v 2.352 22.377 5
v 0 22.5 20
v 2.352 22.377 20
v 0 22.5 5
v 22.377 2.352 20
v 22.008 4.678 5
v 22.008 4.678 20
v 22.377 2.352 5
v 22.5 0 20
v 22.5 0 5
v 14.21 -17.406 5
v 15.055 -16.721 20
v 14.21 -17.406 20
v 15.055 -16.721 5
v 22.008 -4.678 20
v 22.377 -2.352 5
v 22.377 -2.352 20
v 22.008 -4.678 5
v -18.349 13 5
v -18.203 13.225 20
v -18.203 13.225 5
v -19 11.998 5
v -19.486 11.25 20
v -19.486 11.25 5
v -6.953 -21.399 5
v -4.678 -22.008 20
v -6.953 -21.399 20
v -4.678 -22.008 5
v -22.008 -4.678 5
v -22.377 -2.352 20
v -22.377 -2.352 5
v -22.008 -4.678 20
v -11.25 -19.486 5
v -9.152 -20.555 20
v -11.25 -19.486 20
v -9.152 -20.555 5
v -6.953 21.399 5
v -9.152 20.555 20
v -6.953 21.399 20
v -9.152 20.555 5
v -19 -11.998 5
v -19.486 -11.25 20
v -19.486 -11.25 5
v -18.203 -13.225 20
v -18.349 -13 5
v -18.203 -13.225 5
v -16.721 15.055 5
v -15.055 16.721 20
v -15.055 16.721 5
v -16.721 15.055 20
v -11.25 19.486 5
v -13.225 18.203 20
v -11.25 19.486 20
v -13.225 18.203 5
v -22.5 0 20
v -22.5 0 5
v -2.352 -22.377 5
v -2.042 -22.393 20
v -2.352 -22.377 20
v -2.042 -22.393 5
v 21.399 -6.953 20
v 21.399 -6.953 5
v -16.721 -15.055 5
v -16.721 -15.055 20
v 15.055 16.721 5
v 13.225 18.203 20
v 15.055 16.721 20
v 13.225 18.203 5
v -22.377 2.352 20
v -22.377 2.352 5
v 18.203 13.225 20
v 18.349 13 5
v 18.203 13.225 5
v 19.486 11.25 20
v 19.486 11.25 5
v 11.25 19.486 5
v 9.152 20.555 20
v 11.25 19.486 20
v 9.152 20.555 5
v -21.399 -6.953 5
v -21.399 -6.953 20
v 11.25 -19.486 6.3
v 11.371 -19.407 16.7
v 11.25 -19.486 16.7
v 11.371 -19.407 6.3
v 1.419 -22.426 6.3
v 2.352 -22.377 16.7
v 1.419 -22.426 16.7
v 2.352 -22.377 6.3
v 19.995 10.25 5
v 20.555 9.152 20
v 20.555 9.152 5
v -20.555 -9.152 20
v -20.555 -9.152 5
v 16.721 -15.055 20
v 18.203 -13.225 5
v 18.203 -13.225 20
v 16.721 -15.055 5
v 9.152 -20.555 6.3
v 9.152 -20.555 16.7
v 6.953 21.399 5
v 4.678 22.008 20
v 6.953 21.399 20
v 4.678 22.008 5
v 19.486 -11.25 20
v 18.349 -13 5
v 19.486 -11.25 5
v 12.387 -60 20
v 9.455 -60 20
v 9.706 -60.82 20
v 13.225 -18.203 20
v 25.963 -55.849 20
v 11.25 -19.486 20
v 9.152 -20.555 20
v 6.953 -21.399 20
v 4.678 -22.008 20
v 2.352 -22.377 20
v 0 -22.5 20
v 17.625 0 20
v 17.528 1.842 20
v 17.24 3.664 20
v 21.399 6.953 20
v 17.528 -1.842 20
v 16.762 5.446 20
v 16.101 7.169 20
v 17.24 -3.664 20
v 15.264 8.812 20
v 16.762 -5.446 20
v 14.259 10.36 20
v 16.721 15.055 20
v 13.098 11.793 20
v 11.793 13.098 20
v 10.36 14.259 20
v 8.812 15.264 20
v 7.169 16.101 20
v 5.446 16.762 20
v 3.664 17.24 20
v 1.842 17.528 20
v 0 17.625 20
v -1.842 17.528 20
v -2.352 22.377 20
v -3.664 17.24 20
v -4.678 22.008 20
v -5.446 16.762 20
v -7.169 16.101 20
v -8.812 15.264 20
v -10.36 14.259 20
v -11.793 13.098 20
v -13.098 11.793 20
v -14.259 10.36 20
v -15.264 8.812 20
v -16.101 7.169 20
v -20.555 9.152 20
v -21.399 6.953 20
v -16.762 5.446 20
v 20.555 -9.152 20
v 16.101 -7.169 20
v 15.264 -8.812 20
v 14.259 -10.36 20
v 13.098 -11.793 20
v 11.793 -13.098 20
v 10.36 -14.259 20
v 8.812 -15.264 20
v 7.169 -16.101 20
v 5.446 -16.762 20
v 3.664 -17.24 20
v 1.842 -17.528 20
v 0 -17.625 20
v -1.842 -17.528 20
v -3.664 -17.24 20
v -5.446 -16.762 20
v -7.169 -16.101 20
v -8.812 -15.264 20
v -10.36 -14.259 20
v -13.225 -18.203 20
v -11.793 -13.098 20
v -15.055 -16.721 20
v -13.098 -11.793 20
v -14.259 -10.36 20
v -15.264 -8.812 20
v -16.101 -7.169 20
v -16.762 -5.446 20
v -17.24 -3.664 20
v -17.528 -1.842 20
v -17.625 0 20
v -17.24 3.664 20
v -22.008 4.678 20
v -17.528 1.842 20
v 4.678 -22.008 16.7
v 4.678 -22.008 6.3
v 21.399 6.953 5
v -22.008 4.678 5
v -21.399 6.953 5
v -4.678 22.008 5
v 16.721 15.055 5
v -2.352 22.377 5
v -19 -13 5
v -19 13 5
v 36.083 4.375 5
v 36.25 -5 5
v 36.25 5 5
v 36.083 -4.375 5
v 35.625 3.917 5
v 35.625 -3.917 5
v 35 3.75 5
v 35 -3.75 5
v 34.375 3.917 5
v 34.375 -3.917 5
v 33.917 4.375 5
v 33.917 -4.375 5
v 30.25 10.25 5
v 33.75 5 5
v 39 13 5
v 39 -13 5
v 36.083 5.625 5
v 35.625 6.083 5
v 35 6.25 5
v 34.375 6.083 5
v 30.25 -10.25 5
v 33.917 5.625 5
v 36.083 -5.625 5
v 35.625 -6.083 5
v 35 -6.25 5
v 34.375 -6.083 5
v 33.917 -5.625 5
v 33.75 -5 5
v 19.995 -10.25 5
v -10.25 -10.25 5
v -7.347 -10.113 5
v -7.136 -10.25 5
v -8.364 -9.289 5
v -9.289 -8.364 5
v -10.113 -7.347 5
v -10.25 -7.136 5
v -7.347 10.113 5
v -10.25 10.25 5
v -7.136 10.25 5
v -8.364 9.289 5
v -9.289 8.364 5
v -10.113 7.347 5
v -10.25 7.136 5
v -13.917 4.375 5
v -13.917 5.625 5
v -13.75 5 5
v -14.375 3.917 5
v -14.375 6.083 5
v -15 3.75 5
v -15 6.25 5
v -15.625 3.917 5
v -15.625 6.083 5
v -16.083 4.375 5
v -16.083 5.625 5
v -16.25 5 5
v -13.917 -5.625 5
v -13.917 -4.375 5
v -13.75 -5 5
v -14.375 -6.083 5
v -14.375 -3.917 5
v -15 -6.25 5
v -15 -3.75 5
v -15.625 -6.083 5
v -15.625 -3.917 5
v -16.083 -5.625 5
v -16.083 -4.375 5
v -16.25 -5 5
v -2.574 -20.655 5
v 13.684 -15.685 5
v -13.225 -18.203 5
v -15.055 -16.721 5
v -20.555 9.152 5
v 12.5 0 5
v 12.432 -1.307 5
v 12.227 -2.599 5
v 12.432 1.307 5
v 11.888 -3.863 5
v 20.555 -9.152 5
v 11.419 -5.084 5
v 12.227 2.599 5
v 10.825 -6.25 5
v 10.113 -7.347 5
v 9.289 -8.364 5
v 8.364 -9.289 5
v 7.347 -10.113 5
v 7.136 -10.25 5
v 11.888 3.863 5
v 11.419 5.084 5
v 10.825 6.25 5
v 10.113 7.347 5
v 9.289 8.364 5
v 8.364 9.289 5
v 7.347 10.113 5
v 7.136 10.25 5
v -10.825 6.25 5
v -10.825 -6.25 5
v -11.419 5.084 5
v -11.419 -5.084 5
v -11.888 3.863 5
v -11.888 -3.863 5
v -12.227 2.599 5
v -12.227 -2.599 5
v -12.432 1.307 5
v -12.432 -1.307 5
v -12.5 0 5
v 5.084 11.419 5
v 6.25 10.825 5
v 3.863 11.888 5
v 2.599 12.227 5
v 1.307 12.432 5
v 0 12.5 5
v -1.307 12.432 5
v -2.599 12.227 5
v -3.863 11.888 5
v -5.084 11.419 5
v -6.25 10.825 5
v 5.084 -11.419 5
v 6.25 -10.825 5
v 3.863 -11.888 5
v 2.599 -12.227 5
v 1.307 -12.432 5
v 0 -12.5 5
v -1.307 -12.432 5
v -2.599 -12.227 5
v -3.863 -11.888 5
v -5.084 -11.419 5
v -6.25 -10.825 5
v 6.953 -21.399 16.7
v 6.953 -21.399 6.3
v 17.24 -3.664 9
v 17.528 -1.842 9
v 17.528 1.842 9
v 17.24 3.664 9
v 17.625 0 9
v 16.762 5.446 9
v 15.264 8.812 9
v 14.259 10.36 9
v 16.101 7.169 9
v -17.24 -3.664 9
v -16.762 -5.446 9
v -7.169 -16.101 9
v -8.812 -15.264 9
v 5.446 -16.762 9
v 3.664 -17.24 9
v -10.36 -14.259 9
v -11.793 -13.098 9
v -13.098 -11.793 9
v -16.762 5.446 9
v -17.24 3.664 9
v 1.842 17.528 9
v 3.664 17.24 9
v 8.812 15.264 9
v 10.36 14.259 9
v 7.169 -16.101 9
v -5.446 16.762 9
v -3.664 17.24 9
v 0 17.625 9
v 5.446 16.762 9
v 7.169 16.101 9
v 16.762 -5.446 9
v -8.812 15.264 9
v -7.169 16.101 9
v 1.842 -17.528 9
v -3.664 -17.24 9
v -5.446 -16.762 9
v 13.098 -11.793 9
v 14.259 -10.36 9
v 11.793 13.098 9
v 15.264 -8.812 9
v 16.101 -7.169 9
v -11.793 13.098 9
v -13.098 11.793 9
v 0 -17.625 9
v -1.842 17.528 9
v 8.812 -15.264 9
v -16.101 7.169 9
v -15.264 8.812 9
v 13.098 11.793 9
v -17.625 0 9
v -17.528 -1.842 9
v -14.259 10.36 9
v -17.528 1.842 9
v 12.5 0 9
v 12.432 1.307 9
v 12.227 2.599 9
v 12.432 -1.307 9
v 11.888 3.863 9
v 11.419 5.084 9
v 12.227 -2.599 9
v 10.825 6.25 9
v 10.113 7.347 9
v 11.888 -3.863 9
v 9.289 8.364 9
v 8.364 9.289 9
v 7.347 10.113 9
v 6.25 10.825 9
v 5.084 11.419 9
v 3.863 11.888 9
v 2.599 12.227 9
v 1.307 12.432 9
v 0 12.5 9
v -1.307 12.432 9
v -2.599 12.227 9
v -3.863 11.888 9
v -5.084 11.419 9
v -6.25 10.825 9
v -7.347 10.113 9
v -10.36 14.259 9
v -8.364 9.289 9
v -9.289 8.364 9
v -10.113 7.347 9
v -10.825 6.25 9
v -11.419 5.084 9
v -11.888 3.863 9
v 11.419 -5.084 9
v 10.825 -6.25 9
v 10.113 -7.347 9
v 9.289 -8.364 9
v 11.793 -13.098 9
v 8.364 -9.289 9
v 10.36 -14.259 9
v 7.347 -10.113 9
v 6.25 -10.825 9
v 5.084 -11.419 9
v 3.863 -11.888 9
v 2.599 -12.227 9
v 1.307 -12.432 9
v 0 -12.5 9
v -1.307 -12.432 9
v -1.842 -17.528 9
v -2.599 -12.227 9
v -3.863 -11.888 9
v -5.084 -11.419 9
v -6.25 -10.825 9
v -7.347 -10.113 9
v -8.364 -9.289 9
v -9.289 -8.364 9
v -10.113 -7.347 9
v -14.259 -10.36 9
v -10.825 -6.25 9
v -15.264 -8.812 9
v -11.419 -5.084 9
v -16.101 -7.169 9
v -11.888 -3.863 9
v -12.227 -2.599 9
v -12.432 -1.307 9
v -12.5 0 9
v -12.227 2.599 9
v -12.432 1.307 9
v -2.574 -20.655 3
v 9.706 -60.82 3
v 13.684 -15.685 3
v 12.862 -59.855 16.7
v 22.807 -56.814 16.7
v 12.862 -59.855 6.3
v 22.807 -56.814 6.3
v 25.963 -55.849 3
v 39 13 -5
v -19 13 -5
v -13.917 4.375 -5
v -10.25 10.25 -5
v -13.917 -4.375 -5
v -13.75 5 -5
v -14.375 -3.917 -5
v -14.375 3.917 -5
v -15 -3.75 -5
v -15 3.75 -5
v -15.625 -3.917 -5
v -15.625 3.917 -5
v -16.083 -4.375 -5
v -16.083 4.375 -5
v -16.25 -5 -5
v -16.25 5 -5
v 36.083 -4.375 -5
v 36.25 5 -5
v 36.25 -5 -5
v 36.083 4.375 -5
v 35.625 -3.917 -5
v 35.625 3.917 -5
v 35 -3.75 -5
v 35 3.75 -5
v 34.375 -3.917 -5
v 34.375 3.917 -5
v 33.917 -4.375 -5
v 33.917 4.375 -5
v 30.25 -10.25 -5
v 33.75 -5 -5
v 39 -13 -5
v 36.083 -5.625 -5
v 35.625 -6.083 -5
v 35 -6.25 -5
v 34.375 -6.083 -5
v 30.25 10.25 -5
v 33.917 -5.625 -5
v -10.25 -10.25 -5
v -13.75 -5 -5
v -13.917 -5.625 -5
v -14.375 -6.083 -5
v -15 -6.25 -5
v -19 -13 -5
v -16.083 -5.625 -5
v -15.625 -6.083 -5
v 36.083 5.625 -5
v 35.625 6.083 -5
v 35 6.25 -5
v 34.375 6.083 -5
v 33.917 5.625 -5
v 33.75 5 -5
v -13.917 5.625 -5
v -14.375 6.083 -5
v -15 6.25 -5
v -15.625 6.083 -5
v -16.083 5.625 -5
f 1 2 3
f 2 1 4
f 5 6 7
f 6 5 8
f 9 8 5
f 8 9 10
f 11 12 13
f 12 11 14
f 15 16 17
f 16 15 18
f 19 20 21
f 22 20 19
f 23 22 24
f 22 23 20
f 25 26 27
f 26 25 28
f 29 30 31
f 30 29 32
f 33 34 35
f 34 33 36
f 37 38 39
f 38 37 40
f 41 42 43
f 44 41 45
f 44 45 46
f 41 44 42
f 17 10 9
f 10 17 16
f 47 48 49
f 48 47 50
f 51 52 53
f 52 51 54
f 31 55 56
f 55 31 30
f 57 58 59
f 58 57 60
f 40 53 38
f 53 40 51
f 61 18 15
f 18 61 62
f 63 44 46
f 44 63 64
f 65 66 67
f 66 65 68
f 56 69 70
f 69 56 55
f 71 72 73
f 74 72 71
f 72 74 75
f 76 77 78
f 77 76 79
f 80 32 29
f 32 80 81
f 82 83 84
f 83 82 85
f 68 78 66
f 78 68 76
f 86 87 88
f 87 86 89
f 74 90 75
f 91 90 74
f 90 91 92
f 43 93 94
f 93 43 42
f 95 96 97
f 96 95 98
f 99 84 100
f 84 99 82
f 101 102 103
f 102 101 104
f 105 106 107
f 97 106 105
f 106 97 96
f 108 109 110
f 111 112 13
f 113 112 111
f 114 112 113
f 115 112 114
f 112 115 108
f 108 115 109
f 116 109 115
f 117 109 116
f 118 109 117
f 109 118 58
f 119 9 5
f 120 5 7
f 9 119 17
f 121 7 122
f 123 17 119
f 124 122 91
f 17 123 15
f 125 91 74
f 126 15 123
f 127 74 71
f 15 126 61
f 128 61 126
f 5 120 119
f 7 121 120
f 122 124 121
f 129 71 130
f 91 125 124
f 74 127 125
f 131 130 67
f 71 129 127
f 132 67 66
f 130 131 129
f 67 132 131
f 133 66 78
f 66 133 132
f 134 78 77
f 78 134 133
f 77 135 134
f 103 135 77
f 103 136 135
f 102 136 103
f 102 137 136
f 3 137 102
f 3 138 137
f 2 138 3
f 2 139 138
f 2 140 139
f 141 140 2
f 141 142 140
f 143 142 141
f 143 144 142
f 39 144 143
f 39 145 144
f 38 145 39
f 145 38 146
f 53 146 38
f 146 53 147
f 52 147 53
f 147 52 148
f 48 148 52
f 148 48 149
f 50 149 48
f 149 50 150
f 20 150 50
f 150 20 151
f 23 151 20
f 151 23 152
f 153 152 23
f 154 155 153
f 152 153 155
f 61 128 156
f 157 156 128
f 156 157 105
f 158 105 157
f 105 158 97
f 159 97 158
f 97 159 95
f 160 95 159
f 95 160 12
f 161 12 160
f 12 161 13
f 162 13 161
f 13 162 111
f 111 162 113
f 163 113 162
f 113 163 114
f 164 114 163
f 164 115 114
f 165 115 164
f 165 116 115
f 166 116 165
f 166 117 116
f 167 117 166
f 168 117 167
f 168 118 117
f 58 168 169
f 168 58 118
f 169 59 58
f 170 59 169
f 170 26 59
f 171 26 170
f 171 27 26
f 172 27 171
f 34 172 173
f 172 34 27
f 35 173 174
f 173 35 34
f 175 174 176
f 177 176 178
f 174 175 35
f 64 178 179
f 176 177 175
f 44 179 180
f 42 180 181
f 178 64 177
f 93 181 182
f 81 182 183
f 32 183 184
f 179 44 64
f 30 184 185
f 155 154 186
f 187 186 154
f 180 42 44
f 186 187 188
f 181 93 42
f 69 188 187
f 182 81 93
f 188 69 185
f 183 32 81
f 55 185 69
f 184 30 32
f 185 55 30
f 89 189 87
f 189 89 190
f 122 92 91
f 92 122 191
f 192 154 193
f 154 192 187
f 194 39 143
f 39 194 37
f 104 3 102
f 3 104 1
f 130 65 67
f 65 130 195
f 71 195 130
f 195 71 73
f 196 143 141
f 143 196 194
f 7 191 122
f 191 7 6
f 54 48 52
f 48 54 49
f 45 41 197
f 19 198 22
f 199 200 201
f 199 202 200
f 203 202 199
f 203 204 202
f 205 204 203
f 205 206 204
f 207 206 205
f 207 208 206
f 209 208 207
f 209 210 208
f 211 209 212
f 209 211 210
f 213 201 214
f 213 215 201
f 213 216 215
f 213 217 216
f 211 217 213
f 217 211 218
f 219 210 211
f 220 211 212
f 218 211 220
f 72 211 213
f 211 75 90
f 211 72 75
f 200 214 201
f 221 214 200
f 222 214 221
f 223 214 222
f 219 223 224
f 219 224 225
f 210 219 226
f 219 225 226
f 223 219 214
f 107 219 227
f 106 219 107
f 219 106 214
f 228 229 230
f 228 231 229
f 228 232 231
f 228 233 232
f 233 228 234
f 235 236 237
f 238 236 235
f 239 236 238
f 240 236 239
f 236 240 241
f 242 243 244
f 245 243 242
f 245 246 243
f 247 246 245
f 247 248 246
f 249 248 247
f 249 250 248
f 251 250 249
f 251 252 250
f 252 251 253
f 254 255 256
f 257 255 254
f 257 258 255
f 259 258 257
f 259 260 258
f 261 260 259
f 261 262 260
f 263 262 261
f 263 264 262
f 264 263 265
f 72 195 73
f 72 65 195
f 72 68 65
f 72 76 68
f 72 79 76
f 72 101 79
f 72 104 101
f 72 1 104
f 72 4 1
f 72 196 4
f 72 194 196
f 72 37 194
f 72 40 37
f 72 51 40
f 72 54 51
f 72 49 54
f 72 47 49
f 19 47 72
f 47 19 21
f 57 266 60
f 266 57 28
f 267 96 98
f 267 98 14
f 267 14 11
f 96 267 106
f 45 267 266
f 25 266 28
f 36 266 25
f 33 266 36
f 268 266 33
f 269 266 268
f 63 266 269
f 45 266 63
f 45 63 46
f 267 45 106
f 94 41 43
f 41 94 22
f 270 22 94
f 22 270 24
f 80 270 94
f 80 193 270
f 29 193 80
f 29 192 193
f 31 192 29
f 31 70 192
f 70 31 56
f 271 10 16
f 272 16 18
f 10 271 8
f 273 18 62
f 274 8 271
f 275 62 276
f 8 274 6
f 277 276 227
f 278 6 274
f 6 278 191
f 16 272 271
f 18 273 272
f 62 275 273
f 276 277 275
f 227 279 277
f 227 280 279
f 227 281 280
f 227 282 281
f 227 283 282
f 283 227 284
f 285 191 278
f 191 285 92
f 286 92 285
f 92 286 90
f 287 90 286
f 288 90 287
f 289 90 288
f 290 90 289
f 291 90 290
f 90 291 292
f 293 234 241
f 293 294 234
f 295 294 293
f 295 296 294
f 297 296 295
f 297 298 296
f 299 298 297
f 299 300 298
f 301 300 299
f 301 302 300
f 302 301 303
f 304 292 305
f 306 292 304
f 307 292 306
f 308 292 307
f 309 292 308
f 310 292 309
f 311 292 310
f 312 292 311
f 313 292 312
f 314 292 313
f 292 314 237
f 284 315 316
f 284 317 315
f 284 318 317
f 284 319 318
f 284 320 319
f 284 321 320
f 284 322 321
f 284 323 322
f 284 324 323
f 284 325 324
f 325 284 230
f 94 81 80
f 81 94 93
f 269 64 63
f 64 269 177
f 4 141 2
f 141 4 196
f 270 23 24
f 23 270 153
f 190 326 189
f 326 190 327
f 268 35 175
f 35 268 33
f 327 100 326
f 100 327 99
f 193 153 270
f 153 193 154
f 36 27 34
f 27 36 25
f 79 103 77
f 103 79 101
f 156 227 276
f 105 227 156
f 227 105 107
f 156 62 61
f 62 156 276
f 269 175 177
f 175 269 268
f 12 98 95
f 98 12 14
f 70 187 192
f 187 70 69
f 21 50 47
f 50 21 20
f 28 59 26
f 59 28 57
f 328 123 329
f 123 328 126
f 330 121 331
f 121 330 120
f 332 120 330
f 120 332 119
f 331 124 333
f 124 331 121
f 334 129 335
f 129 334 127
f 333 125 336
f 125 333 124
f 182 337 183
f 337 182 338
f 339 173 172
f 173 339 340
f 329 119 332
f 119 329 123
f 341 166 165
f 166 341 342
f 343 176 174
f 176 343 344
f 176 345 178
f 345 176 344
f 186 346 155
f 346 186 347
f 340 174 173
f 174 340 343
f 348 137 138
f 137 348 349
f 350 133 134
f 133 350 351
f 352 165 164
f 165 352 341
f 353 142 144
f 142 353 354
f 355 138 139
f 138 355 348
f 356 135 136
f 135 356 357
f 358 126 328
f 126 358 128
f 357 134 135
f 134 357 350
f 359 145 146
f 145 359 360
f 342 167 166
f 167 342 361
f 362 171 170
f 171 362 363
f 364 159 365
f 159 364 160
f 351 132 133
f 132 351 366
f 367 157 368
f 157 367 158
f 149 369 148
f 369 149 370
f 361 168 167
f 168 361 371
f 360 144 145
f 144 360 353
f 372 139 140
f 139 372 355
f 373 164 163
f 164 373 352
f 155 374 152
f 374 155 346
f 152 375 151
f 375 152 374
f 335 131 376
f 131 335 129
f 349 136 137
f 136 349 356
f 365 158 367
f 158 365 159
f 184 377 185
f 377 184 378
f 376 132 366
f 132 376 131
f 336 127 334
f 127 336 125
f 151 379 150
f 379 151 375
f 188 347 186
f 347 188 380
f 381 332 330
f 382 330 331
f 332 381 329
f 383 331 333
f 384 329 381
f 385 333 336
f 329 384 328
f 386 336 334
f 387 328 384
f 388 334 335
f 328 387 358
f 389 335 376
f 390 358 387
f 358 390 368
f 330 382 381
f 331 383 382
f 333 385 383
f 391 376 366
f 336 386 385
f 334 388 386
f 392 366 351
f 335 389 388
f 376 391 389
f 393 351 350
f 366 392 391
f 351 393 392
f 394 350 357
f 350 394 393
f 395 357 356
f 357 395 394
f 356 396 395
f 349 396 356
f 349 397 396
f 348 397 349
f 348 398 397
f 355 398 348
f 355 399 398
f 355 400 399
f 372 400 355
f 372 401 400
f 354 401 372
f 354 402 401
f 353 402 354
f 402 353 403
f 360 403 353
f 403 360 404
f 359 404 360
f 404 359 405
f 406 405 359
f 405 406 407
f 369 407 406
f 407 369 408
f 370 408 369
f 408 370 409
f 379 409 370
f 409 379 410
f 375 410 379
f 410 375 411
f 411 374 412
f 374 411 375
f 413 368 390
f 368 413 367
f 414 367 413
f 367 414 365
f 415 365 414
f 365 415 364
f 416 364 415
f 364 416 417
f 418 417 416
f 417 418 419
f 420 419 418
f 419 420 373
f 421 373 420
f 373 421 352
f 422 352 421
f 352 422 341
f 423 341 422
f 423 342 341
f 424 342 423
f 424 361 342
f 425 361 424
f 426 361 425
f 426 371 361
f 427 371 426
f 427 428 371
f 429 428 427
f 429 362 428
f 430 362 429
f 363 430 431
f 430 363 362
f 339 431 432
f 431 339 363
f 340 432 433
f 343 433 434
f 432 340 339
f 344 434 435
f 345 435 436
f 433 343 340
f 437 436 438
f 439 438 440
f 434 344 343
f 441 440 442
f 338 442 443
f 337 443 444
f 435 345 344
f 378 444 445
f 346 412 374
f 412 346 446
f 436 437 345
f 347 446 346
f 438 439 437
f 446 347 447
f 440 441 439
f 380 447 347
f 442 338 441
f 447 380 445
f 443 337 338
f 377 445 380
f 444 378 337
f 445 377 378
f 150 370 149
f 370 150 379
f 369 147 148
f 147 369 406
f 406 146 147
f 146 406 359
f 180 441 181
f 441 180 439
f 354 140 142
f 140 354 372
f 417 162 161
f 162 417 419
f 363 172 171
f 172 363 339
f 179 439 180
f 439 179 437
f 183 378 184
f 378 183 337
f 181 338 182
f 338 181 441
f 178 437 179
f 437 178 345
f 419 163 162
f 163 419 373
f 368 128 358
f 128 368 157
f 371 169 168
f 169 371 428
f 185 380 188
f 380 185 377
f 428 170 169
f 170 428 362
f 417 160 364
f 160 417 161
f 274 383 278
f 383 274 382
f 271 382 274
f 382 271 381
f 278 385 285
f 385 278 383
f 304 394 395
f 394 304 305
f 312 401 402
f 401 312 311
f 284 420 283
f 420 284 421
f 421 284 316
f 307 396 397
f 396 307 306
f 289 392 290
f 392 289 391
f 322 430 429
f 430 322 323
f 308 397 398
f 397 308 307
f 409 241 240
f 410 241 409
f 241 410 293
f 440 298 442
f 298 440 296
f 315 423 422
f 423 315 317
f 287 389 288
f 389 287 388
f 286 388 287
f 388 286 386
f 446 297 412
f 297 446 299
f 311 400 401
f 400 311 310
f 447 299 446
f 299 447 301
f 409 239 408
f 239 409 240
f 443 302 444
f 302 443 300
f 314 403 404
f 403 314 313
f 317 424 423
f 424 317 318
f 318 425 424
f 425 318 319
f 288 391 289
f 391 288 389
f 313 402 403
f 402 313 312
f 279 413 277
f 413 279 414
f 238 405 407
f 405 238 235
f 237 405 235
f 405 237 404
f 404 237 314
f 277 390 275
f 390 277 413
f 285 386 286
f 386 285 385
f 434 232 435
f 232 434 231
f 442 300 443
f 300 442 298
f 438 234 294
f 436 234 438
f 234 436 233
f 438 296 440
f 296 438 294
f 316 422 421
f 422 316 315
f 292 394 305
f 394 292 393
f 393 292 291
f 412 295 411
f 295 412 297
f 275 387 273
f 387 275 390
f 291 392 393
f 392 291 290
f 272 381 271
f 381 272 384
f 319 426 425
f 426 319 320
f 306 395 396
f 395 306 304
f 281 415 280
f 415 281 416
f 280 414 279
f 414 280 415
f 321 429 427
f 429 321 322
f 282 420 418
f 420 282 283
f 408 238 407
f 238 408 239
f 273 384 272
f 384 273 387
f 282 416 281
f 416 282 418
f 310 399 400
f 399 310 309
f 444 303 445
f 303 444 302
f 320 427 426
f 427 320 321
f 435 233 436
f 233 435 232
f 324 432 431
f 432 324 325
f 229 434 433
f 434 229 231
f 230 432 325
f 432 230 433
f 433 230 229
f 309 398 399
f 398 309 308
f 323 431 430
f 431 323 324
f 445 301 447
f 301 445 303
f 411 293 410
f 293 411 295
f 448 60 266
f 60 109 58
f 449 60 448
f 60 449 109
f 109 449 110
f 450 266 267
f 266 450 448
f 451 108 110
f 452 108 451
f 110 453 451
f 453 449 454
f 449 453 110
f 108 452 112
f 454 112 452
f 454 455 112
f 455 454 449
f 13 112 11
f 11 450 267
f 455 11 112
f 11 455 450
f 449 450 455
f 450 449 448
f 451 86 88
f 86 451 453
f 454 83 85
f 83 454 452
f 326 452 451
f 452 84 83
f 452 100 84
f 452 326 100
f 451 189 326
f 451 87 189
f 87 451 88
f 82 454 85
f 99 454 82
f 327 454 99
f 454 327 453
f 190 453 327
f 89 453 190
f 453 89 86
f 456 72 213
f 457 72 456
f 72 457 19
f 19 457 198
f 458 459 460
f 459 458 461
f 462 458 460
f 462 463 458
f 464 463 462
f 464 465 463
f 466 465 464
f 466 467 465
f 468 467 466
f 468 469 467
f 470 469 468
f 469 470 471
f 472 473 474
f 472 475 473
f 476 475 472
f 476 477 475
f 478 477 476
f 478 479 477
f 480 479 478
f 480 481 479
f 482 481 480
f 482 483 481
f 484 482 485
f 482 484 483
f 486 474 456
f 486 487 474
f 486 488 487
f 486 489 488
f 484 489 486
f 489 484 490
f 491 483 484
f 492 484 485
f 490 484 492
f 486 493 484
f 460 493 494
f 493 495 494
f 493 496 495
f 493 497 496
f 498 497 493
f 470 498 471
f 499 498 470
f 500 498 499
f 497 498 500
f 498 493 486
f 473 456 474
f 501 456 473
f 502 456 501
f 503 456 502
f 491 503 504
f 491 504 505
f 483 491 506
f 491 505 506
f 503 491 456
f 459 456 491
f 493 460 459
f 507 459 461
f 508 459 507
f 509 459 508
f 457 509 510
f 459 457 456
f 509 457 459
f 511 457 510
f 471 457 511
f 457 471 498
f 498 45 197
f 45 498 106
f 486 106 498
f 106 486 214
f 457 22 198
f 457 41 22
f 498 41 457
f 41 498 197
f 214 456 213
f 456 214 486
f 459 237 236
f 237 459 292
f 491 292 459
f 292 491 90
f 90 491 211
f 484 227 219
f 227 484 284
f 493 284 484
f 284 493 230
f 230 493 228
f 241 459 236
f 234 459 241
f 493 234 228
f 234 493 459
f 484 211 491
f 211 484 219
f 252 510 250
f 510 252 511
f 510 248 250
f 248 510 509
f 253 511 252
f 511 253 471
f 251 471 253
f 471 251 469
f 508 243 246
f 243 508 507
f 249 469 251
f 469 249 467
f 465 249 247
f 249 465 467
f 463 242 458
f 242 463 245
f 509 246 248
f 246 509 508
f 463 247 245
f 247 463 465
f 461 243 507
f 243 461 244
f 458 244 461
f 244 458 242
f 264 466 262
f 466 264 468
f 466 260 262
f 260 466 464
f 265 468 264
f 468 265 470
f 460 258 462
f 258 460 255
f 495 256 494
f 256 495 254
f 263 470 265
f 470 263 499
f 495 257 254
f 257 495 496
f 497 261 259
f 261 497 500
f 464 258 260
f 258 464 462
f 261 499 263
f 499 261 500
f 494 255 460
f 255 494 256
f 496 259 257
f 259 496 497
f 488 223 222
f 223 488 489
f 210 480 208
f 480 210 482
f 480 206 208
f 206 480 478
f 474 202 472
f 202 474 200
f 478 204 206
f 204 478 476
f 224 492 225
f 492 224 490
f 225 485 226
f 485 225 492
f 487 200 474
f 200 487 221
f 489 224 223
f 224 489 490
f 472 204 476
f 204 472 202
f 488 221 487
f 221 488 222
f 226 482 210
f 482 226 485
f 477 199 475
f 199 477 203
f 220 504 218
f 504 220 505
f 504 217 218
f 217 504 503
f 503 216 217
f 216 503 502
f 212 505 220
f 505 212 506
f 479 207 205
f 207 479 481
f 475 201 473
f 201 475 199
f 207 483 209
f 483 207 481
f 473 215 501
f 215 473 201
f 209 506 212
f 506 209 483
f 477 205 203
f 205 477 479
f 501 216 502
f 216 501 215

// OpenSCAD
$fn=20;

translate([0,0,5])
difference(){
    cylinder(d=45,h=15,$fn=60);
    translate([0,0,4])cylinder(d=35.25,h=12,$fn=60);
    translate([0,0,-1])cylinder(d=25,h=12,$fn=60);
}

difference(){
rotate([0,0,-163])
translate([0,40,11.5])
rotate([90,0,0])
difference(){
cube([17,17,42],center=true);
cube([10.4,10.4,42],center=true);
}
translate([0,0,5])cylinder(d=35.6,h=16,$fn=60);
translate([0,0,25])cube([120,120,10],center=true);
translate([10,0,0])rotate([0,0,90])
cube([20.5,40.5,12],center=true);
}


$fn=12;
translate([10,0,0])rotate([0,0,90])
difference(){
cube([26,58,10],center=true);
cube([20.5,40.5,12],center=true);
translate([5,25,-6])cylinder(d=2.5,h=12);
translate([-5,25,-6])cylinder(d=2.5,h=12);
translate([-5,-25,-6])cylinder(d=2.5,h=12);
translate([5,-25,-6])cylinder(d=2.5,h=12);
}
